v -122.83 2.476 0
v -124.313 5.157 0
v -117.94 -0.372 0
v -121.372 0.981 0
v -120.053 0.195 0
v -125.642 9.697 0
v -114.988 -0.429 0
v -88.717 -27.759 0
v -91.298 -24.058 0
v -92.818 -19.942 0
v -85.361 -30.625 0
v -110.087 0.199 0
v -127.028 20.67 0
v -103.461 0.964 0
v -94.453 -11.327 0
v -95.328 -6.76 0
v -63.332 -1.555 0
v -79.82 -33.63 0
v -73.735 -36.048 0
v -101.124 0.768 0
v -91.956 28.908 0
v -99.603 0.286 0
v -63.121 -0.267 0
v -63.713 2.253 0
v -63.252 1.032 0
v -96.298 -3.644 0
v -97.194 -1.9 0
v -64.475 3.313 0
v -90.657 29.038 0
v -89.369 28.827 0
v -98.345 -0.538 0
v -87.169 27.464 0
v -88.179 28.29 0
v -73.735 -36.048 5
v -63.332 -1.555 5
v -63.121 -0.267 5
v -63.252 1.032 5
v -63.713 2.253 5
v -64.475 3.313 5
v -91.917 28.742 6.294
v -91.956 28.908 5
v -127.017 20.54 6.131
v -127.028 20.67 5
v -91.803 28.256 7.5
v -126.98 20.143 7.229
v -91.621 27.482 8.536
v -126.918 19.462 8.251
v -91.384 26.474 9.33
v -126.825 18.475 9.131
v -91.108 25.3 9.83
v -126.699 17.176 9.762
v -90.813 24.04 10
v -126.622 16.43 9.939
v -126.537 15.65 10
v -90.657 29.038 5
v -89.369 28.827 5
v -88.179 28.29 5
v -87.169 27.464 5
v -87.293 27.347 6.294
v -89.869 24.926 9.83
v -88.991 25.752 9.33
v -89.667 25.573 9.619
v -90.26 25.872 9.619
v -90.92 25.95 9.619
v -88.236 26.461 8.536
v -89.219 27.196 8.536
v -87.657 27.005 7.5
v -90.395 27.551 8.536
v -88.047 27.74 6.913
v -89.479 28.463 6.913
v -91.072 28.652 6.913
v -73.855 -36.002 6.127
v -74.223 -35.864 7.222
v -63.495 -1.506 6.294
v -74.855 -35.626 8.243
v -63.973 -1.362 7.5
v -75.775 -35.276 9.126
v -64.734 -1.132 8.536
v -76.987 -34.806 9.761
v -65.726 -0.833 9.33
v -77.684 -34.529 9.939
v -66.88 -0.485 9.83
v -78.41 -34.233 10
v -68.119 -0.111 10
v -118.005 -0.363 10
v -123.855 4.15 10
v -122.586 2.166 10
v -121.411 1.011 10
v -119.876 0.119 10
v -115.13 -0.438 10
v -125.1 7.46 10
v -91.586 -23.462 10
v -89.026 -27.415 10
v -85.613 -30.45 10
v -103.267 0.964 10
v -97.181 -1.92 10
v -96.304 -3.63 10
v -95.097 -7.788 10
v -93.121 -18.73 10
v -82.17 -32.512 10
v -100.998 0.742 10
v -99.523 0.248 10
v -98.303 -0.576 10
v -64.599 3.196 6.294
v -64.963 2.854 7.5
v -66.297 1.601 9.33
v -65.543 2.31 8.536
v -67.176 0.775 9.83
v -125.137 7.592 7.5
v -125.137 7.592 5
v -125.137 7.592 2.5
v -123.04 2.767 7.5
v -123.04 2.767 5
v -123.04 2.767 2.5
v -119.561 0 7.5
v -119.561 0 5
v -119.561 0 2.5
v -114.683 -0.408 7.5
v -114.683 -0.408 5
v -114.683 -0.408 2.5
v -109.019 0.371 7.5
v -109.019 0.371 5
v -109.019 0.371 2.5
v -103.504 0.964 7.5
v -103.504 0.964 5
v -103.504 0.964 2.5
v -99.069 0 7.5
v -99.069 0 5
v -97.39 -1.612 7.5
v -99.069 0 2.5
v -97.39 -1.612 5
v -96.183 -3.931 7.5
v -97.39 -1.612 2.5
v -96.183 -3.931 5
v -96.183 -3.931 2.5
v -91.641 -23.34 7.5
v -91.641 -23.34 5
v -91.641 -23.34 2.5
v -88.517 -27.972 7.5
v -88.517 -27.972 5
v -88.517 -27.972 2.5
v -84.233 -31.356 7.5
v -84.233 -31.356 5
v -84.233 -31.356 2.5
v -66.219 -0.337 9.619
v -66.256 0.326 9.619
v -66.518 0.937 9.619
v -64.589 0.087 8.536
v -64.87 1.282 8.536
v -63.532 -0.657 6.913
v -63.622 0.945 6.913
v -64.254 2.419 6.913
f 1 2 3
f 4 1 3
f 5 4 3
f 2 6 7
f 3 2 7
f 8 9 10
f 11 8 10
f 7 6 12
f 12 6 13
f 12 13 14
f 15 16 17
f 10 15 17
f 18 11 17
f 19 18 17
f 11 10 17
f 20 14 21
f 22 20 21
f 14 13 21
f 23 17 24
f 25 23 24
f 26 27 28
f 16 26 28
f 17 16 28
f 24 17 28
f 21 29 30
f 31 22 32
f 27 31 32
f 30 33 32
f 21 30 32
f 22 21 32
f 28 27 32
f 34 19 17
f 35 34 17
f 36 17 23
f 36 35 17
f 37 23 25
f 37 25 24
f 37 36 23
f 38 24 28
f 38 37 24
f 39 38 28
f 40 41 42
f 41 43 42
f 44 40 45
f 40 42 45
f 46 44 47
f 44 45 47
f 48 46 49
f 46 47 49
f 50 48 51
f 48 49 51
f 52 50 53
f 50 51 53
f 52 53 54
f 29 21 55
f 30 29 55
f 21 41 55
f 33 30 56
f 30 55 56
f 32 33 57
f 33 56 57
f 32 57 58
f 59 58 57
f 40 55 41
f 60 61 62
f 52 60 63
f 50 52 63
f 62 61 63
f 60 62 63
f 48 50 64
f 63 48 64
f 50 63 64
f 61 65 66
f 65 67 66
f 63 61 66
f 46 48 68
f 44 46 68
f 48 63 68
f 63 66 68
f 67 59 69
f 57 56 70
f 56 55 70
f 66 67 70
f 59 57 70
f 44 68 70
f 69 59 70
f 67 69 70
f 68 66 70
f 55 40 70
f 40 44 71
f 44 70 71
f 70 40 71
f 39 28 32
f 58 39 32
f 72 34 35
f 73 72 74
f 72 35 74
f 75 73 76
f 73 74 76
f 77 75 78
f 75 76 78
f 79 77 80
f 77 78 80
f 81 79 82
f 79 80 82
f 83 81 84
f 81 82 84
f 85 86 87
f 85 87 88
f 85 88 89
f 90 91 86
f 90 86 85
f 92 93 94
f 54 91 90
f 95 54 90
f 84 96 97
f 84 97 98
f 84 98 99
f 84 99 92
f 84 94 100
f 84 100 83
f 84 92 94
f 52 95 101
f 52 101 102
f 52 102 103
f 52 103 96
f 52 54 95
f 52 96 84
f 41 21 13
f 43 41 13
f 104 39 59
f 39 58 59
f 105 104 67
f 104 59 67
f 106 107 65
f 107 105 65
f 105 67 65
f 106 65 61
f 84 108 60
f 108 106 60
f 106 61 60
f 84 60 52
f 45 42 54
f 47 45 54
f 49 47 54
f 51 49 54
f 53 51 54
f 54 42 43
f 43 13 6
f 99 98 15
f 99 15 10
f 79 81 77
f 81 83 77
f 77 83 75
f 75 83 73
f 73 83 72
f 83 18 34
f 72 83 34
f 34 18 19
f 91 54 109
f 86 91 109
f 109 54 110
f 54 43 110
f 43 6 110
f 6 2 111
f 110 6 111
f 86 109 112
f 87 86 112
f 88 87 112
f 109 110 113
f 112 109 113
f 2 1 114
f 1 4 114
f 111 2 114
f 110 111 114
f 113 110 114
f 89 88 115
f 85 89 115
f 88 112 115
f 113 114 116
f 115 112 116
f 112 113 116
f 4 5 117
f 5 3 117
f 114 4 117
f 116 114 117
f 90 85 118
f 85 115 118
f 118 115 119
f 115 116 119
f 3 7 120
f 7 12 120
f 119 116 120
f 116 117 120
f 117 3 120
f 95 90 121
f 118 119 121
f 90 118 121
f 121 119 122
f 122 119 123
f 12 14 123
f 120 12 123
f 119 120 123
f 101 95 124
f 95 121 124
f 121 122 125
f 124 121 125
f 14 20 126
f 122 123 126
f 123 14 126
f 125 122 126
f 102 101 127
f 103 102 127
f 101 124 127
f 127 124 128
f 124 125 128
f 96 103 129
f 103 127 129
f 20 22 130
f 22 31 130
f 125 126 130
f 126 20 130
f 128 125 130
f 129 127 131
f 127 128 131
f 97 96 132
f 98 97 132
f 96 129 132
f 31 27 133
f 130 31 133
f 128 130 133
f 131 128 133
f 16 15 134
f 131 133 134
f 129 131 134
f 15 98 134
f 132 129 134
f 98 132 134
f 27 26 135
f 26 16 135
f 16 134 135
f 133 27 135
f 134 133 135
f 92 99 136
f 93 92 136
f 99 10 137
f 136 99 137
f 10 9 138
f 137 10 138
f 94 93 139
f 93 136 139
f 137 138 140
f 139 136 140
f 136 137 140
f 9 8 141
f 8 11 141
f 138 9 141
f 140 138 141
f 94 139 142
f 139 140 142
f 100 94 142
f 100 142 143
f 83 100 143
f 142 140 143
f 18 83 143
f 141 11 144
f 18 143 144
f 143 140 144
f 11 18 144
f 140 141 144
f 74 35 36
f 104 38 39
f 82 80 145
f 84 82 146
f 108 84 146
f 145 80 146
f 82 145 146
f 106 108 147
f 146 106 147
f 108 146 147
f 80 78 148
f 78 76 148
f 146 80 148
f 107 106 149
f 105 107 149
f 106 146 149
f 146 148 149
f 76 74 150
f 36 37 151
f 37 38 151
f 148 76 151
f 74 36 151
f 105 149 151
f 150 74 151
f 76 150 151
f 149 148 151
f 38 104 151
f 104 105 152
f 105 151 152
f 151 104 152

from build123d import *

# Parameters (mm, degrees)
F1_DEPTH = 10
F2_R     = 5


with BuildPart() as f1:
    # F0 (on Top) → F1 (new body)
    with BuildSketch(Plane.XY):
        with BuildLine():
            Line((-89.1454590492, 29.5676813811), (-127.0284729071, 20.6701940507))
            add(Edge.make_bspline(
                [(-127.0284729071, 20.6701940507), (-126.1771964504, 11.341777819), (-124.5039244495, -6.994189975), (-92.7519872862, 8.2636051601), (-96.1752718796, -27.6178091211), (-81.0772659553, -33.2893484208), (-73.7345589332, -36.0476233646)],
                knots=[0, 0, 0, 0, 0.2487050848, 0.4888555905, 0.7514119637, 1, 1, 1, 1], degree=3))
            Line((-73.7345589332, -36.0476233646), (-62.4985020623, 1.2087726734))
            Line((-62.4985020623, 1.2087726734), (-89.1454590492, 29.5676813811))
        make_face()
    extrude(amount=F1_DEPTH)

    # F2
    f2_edges = [f1.edges().sort_by_distance(p)[0] for p in [
        (-68.11653, -17.419425, 10),
        (-75.821981, 15.388227, 10),
        (-108.086966, 25.118938, 10),
        (-62.498502, 1.208773, 5),
        (-89.145459, 29.567681, 5),
    ]]
    fillet(f2_edges, radius=F2_R)


solid = f1.part
